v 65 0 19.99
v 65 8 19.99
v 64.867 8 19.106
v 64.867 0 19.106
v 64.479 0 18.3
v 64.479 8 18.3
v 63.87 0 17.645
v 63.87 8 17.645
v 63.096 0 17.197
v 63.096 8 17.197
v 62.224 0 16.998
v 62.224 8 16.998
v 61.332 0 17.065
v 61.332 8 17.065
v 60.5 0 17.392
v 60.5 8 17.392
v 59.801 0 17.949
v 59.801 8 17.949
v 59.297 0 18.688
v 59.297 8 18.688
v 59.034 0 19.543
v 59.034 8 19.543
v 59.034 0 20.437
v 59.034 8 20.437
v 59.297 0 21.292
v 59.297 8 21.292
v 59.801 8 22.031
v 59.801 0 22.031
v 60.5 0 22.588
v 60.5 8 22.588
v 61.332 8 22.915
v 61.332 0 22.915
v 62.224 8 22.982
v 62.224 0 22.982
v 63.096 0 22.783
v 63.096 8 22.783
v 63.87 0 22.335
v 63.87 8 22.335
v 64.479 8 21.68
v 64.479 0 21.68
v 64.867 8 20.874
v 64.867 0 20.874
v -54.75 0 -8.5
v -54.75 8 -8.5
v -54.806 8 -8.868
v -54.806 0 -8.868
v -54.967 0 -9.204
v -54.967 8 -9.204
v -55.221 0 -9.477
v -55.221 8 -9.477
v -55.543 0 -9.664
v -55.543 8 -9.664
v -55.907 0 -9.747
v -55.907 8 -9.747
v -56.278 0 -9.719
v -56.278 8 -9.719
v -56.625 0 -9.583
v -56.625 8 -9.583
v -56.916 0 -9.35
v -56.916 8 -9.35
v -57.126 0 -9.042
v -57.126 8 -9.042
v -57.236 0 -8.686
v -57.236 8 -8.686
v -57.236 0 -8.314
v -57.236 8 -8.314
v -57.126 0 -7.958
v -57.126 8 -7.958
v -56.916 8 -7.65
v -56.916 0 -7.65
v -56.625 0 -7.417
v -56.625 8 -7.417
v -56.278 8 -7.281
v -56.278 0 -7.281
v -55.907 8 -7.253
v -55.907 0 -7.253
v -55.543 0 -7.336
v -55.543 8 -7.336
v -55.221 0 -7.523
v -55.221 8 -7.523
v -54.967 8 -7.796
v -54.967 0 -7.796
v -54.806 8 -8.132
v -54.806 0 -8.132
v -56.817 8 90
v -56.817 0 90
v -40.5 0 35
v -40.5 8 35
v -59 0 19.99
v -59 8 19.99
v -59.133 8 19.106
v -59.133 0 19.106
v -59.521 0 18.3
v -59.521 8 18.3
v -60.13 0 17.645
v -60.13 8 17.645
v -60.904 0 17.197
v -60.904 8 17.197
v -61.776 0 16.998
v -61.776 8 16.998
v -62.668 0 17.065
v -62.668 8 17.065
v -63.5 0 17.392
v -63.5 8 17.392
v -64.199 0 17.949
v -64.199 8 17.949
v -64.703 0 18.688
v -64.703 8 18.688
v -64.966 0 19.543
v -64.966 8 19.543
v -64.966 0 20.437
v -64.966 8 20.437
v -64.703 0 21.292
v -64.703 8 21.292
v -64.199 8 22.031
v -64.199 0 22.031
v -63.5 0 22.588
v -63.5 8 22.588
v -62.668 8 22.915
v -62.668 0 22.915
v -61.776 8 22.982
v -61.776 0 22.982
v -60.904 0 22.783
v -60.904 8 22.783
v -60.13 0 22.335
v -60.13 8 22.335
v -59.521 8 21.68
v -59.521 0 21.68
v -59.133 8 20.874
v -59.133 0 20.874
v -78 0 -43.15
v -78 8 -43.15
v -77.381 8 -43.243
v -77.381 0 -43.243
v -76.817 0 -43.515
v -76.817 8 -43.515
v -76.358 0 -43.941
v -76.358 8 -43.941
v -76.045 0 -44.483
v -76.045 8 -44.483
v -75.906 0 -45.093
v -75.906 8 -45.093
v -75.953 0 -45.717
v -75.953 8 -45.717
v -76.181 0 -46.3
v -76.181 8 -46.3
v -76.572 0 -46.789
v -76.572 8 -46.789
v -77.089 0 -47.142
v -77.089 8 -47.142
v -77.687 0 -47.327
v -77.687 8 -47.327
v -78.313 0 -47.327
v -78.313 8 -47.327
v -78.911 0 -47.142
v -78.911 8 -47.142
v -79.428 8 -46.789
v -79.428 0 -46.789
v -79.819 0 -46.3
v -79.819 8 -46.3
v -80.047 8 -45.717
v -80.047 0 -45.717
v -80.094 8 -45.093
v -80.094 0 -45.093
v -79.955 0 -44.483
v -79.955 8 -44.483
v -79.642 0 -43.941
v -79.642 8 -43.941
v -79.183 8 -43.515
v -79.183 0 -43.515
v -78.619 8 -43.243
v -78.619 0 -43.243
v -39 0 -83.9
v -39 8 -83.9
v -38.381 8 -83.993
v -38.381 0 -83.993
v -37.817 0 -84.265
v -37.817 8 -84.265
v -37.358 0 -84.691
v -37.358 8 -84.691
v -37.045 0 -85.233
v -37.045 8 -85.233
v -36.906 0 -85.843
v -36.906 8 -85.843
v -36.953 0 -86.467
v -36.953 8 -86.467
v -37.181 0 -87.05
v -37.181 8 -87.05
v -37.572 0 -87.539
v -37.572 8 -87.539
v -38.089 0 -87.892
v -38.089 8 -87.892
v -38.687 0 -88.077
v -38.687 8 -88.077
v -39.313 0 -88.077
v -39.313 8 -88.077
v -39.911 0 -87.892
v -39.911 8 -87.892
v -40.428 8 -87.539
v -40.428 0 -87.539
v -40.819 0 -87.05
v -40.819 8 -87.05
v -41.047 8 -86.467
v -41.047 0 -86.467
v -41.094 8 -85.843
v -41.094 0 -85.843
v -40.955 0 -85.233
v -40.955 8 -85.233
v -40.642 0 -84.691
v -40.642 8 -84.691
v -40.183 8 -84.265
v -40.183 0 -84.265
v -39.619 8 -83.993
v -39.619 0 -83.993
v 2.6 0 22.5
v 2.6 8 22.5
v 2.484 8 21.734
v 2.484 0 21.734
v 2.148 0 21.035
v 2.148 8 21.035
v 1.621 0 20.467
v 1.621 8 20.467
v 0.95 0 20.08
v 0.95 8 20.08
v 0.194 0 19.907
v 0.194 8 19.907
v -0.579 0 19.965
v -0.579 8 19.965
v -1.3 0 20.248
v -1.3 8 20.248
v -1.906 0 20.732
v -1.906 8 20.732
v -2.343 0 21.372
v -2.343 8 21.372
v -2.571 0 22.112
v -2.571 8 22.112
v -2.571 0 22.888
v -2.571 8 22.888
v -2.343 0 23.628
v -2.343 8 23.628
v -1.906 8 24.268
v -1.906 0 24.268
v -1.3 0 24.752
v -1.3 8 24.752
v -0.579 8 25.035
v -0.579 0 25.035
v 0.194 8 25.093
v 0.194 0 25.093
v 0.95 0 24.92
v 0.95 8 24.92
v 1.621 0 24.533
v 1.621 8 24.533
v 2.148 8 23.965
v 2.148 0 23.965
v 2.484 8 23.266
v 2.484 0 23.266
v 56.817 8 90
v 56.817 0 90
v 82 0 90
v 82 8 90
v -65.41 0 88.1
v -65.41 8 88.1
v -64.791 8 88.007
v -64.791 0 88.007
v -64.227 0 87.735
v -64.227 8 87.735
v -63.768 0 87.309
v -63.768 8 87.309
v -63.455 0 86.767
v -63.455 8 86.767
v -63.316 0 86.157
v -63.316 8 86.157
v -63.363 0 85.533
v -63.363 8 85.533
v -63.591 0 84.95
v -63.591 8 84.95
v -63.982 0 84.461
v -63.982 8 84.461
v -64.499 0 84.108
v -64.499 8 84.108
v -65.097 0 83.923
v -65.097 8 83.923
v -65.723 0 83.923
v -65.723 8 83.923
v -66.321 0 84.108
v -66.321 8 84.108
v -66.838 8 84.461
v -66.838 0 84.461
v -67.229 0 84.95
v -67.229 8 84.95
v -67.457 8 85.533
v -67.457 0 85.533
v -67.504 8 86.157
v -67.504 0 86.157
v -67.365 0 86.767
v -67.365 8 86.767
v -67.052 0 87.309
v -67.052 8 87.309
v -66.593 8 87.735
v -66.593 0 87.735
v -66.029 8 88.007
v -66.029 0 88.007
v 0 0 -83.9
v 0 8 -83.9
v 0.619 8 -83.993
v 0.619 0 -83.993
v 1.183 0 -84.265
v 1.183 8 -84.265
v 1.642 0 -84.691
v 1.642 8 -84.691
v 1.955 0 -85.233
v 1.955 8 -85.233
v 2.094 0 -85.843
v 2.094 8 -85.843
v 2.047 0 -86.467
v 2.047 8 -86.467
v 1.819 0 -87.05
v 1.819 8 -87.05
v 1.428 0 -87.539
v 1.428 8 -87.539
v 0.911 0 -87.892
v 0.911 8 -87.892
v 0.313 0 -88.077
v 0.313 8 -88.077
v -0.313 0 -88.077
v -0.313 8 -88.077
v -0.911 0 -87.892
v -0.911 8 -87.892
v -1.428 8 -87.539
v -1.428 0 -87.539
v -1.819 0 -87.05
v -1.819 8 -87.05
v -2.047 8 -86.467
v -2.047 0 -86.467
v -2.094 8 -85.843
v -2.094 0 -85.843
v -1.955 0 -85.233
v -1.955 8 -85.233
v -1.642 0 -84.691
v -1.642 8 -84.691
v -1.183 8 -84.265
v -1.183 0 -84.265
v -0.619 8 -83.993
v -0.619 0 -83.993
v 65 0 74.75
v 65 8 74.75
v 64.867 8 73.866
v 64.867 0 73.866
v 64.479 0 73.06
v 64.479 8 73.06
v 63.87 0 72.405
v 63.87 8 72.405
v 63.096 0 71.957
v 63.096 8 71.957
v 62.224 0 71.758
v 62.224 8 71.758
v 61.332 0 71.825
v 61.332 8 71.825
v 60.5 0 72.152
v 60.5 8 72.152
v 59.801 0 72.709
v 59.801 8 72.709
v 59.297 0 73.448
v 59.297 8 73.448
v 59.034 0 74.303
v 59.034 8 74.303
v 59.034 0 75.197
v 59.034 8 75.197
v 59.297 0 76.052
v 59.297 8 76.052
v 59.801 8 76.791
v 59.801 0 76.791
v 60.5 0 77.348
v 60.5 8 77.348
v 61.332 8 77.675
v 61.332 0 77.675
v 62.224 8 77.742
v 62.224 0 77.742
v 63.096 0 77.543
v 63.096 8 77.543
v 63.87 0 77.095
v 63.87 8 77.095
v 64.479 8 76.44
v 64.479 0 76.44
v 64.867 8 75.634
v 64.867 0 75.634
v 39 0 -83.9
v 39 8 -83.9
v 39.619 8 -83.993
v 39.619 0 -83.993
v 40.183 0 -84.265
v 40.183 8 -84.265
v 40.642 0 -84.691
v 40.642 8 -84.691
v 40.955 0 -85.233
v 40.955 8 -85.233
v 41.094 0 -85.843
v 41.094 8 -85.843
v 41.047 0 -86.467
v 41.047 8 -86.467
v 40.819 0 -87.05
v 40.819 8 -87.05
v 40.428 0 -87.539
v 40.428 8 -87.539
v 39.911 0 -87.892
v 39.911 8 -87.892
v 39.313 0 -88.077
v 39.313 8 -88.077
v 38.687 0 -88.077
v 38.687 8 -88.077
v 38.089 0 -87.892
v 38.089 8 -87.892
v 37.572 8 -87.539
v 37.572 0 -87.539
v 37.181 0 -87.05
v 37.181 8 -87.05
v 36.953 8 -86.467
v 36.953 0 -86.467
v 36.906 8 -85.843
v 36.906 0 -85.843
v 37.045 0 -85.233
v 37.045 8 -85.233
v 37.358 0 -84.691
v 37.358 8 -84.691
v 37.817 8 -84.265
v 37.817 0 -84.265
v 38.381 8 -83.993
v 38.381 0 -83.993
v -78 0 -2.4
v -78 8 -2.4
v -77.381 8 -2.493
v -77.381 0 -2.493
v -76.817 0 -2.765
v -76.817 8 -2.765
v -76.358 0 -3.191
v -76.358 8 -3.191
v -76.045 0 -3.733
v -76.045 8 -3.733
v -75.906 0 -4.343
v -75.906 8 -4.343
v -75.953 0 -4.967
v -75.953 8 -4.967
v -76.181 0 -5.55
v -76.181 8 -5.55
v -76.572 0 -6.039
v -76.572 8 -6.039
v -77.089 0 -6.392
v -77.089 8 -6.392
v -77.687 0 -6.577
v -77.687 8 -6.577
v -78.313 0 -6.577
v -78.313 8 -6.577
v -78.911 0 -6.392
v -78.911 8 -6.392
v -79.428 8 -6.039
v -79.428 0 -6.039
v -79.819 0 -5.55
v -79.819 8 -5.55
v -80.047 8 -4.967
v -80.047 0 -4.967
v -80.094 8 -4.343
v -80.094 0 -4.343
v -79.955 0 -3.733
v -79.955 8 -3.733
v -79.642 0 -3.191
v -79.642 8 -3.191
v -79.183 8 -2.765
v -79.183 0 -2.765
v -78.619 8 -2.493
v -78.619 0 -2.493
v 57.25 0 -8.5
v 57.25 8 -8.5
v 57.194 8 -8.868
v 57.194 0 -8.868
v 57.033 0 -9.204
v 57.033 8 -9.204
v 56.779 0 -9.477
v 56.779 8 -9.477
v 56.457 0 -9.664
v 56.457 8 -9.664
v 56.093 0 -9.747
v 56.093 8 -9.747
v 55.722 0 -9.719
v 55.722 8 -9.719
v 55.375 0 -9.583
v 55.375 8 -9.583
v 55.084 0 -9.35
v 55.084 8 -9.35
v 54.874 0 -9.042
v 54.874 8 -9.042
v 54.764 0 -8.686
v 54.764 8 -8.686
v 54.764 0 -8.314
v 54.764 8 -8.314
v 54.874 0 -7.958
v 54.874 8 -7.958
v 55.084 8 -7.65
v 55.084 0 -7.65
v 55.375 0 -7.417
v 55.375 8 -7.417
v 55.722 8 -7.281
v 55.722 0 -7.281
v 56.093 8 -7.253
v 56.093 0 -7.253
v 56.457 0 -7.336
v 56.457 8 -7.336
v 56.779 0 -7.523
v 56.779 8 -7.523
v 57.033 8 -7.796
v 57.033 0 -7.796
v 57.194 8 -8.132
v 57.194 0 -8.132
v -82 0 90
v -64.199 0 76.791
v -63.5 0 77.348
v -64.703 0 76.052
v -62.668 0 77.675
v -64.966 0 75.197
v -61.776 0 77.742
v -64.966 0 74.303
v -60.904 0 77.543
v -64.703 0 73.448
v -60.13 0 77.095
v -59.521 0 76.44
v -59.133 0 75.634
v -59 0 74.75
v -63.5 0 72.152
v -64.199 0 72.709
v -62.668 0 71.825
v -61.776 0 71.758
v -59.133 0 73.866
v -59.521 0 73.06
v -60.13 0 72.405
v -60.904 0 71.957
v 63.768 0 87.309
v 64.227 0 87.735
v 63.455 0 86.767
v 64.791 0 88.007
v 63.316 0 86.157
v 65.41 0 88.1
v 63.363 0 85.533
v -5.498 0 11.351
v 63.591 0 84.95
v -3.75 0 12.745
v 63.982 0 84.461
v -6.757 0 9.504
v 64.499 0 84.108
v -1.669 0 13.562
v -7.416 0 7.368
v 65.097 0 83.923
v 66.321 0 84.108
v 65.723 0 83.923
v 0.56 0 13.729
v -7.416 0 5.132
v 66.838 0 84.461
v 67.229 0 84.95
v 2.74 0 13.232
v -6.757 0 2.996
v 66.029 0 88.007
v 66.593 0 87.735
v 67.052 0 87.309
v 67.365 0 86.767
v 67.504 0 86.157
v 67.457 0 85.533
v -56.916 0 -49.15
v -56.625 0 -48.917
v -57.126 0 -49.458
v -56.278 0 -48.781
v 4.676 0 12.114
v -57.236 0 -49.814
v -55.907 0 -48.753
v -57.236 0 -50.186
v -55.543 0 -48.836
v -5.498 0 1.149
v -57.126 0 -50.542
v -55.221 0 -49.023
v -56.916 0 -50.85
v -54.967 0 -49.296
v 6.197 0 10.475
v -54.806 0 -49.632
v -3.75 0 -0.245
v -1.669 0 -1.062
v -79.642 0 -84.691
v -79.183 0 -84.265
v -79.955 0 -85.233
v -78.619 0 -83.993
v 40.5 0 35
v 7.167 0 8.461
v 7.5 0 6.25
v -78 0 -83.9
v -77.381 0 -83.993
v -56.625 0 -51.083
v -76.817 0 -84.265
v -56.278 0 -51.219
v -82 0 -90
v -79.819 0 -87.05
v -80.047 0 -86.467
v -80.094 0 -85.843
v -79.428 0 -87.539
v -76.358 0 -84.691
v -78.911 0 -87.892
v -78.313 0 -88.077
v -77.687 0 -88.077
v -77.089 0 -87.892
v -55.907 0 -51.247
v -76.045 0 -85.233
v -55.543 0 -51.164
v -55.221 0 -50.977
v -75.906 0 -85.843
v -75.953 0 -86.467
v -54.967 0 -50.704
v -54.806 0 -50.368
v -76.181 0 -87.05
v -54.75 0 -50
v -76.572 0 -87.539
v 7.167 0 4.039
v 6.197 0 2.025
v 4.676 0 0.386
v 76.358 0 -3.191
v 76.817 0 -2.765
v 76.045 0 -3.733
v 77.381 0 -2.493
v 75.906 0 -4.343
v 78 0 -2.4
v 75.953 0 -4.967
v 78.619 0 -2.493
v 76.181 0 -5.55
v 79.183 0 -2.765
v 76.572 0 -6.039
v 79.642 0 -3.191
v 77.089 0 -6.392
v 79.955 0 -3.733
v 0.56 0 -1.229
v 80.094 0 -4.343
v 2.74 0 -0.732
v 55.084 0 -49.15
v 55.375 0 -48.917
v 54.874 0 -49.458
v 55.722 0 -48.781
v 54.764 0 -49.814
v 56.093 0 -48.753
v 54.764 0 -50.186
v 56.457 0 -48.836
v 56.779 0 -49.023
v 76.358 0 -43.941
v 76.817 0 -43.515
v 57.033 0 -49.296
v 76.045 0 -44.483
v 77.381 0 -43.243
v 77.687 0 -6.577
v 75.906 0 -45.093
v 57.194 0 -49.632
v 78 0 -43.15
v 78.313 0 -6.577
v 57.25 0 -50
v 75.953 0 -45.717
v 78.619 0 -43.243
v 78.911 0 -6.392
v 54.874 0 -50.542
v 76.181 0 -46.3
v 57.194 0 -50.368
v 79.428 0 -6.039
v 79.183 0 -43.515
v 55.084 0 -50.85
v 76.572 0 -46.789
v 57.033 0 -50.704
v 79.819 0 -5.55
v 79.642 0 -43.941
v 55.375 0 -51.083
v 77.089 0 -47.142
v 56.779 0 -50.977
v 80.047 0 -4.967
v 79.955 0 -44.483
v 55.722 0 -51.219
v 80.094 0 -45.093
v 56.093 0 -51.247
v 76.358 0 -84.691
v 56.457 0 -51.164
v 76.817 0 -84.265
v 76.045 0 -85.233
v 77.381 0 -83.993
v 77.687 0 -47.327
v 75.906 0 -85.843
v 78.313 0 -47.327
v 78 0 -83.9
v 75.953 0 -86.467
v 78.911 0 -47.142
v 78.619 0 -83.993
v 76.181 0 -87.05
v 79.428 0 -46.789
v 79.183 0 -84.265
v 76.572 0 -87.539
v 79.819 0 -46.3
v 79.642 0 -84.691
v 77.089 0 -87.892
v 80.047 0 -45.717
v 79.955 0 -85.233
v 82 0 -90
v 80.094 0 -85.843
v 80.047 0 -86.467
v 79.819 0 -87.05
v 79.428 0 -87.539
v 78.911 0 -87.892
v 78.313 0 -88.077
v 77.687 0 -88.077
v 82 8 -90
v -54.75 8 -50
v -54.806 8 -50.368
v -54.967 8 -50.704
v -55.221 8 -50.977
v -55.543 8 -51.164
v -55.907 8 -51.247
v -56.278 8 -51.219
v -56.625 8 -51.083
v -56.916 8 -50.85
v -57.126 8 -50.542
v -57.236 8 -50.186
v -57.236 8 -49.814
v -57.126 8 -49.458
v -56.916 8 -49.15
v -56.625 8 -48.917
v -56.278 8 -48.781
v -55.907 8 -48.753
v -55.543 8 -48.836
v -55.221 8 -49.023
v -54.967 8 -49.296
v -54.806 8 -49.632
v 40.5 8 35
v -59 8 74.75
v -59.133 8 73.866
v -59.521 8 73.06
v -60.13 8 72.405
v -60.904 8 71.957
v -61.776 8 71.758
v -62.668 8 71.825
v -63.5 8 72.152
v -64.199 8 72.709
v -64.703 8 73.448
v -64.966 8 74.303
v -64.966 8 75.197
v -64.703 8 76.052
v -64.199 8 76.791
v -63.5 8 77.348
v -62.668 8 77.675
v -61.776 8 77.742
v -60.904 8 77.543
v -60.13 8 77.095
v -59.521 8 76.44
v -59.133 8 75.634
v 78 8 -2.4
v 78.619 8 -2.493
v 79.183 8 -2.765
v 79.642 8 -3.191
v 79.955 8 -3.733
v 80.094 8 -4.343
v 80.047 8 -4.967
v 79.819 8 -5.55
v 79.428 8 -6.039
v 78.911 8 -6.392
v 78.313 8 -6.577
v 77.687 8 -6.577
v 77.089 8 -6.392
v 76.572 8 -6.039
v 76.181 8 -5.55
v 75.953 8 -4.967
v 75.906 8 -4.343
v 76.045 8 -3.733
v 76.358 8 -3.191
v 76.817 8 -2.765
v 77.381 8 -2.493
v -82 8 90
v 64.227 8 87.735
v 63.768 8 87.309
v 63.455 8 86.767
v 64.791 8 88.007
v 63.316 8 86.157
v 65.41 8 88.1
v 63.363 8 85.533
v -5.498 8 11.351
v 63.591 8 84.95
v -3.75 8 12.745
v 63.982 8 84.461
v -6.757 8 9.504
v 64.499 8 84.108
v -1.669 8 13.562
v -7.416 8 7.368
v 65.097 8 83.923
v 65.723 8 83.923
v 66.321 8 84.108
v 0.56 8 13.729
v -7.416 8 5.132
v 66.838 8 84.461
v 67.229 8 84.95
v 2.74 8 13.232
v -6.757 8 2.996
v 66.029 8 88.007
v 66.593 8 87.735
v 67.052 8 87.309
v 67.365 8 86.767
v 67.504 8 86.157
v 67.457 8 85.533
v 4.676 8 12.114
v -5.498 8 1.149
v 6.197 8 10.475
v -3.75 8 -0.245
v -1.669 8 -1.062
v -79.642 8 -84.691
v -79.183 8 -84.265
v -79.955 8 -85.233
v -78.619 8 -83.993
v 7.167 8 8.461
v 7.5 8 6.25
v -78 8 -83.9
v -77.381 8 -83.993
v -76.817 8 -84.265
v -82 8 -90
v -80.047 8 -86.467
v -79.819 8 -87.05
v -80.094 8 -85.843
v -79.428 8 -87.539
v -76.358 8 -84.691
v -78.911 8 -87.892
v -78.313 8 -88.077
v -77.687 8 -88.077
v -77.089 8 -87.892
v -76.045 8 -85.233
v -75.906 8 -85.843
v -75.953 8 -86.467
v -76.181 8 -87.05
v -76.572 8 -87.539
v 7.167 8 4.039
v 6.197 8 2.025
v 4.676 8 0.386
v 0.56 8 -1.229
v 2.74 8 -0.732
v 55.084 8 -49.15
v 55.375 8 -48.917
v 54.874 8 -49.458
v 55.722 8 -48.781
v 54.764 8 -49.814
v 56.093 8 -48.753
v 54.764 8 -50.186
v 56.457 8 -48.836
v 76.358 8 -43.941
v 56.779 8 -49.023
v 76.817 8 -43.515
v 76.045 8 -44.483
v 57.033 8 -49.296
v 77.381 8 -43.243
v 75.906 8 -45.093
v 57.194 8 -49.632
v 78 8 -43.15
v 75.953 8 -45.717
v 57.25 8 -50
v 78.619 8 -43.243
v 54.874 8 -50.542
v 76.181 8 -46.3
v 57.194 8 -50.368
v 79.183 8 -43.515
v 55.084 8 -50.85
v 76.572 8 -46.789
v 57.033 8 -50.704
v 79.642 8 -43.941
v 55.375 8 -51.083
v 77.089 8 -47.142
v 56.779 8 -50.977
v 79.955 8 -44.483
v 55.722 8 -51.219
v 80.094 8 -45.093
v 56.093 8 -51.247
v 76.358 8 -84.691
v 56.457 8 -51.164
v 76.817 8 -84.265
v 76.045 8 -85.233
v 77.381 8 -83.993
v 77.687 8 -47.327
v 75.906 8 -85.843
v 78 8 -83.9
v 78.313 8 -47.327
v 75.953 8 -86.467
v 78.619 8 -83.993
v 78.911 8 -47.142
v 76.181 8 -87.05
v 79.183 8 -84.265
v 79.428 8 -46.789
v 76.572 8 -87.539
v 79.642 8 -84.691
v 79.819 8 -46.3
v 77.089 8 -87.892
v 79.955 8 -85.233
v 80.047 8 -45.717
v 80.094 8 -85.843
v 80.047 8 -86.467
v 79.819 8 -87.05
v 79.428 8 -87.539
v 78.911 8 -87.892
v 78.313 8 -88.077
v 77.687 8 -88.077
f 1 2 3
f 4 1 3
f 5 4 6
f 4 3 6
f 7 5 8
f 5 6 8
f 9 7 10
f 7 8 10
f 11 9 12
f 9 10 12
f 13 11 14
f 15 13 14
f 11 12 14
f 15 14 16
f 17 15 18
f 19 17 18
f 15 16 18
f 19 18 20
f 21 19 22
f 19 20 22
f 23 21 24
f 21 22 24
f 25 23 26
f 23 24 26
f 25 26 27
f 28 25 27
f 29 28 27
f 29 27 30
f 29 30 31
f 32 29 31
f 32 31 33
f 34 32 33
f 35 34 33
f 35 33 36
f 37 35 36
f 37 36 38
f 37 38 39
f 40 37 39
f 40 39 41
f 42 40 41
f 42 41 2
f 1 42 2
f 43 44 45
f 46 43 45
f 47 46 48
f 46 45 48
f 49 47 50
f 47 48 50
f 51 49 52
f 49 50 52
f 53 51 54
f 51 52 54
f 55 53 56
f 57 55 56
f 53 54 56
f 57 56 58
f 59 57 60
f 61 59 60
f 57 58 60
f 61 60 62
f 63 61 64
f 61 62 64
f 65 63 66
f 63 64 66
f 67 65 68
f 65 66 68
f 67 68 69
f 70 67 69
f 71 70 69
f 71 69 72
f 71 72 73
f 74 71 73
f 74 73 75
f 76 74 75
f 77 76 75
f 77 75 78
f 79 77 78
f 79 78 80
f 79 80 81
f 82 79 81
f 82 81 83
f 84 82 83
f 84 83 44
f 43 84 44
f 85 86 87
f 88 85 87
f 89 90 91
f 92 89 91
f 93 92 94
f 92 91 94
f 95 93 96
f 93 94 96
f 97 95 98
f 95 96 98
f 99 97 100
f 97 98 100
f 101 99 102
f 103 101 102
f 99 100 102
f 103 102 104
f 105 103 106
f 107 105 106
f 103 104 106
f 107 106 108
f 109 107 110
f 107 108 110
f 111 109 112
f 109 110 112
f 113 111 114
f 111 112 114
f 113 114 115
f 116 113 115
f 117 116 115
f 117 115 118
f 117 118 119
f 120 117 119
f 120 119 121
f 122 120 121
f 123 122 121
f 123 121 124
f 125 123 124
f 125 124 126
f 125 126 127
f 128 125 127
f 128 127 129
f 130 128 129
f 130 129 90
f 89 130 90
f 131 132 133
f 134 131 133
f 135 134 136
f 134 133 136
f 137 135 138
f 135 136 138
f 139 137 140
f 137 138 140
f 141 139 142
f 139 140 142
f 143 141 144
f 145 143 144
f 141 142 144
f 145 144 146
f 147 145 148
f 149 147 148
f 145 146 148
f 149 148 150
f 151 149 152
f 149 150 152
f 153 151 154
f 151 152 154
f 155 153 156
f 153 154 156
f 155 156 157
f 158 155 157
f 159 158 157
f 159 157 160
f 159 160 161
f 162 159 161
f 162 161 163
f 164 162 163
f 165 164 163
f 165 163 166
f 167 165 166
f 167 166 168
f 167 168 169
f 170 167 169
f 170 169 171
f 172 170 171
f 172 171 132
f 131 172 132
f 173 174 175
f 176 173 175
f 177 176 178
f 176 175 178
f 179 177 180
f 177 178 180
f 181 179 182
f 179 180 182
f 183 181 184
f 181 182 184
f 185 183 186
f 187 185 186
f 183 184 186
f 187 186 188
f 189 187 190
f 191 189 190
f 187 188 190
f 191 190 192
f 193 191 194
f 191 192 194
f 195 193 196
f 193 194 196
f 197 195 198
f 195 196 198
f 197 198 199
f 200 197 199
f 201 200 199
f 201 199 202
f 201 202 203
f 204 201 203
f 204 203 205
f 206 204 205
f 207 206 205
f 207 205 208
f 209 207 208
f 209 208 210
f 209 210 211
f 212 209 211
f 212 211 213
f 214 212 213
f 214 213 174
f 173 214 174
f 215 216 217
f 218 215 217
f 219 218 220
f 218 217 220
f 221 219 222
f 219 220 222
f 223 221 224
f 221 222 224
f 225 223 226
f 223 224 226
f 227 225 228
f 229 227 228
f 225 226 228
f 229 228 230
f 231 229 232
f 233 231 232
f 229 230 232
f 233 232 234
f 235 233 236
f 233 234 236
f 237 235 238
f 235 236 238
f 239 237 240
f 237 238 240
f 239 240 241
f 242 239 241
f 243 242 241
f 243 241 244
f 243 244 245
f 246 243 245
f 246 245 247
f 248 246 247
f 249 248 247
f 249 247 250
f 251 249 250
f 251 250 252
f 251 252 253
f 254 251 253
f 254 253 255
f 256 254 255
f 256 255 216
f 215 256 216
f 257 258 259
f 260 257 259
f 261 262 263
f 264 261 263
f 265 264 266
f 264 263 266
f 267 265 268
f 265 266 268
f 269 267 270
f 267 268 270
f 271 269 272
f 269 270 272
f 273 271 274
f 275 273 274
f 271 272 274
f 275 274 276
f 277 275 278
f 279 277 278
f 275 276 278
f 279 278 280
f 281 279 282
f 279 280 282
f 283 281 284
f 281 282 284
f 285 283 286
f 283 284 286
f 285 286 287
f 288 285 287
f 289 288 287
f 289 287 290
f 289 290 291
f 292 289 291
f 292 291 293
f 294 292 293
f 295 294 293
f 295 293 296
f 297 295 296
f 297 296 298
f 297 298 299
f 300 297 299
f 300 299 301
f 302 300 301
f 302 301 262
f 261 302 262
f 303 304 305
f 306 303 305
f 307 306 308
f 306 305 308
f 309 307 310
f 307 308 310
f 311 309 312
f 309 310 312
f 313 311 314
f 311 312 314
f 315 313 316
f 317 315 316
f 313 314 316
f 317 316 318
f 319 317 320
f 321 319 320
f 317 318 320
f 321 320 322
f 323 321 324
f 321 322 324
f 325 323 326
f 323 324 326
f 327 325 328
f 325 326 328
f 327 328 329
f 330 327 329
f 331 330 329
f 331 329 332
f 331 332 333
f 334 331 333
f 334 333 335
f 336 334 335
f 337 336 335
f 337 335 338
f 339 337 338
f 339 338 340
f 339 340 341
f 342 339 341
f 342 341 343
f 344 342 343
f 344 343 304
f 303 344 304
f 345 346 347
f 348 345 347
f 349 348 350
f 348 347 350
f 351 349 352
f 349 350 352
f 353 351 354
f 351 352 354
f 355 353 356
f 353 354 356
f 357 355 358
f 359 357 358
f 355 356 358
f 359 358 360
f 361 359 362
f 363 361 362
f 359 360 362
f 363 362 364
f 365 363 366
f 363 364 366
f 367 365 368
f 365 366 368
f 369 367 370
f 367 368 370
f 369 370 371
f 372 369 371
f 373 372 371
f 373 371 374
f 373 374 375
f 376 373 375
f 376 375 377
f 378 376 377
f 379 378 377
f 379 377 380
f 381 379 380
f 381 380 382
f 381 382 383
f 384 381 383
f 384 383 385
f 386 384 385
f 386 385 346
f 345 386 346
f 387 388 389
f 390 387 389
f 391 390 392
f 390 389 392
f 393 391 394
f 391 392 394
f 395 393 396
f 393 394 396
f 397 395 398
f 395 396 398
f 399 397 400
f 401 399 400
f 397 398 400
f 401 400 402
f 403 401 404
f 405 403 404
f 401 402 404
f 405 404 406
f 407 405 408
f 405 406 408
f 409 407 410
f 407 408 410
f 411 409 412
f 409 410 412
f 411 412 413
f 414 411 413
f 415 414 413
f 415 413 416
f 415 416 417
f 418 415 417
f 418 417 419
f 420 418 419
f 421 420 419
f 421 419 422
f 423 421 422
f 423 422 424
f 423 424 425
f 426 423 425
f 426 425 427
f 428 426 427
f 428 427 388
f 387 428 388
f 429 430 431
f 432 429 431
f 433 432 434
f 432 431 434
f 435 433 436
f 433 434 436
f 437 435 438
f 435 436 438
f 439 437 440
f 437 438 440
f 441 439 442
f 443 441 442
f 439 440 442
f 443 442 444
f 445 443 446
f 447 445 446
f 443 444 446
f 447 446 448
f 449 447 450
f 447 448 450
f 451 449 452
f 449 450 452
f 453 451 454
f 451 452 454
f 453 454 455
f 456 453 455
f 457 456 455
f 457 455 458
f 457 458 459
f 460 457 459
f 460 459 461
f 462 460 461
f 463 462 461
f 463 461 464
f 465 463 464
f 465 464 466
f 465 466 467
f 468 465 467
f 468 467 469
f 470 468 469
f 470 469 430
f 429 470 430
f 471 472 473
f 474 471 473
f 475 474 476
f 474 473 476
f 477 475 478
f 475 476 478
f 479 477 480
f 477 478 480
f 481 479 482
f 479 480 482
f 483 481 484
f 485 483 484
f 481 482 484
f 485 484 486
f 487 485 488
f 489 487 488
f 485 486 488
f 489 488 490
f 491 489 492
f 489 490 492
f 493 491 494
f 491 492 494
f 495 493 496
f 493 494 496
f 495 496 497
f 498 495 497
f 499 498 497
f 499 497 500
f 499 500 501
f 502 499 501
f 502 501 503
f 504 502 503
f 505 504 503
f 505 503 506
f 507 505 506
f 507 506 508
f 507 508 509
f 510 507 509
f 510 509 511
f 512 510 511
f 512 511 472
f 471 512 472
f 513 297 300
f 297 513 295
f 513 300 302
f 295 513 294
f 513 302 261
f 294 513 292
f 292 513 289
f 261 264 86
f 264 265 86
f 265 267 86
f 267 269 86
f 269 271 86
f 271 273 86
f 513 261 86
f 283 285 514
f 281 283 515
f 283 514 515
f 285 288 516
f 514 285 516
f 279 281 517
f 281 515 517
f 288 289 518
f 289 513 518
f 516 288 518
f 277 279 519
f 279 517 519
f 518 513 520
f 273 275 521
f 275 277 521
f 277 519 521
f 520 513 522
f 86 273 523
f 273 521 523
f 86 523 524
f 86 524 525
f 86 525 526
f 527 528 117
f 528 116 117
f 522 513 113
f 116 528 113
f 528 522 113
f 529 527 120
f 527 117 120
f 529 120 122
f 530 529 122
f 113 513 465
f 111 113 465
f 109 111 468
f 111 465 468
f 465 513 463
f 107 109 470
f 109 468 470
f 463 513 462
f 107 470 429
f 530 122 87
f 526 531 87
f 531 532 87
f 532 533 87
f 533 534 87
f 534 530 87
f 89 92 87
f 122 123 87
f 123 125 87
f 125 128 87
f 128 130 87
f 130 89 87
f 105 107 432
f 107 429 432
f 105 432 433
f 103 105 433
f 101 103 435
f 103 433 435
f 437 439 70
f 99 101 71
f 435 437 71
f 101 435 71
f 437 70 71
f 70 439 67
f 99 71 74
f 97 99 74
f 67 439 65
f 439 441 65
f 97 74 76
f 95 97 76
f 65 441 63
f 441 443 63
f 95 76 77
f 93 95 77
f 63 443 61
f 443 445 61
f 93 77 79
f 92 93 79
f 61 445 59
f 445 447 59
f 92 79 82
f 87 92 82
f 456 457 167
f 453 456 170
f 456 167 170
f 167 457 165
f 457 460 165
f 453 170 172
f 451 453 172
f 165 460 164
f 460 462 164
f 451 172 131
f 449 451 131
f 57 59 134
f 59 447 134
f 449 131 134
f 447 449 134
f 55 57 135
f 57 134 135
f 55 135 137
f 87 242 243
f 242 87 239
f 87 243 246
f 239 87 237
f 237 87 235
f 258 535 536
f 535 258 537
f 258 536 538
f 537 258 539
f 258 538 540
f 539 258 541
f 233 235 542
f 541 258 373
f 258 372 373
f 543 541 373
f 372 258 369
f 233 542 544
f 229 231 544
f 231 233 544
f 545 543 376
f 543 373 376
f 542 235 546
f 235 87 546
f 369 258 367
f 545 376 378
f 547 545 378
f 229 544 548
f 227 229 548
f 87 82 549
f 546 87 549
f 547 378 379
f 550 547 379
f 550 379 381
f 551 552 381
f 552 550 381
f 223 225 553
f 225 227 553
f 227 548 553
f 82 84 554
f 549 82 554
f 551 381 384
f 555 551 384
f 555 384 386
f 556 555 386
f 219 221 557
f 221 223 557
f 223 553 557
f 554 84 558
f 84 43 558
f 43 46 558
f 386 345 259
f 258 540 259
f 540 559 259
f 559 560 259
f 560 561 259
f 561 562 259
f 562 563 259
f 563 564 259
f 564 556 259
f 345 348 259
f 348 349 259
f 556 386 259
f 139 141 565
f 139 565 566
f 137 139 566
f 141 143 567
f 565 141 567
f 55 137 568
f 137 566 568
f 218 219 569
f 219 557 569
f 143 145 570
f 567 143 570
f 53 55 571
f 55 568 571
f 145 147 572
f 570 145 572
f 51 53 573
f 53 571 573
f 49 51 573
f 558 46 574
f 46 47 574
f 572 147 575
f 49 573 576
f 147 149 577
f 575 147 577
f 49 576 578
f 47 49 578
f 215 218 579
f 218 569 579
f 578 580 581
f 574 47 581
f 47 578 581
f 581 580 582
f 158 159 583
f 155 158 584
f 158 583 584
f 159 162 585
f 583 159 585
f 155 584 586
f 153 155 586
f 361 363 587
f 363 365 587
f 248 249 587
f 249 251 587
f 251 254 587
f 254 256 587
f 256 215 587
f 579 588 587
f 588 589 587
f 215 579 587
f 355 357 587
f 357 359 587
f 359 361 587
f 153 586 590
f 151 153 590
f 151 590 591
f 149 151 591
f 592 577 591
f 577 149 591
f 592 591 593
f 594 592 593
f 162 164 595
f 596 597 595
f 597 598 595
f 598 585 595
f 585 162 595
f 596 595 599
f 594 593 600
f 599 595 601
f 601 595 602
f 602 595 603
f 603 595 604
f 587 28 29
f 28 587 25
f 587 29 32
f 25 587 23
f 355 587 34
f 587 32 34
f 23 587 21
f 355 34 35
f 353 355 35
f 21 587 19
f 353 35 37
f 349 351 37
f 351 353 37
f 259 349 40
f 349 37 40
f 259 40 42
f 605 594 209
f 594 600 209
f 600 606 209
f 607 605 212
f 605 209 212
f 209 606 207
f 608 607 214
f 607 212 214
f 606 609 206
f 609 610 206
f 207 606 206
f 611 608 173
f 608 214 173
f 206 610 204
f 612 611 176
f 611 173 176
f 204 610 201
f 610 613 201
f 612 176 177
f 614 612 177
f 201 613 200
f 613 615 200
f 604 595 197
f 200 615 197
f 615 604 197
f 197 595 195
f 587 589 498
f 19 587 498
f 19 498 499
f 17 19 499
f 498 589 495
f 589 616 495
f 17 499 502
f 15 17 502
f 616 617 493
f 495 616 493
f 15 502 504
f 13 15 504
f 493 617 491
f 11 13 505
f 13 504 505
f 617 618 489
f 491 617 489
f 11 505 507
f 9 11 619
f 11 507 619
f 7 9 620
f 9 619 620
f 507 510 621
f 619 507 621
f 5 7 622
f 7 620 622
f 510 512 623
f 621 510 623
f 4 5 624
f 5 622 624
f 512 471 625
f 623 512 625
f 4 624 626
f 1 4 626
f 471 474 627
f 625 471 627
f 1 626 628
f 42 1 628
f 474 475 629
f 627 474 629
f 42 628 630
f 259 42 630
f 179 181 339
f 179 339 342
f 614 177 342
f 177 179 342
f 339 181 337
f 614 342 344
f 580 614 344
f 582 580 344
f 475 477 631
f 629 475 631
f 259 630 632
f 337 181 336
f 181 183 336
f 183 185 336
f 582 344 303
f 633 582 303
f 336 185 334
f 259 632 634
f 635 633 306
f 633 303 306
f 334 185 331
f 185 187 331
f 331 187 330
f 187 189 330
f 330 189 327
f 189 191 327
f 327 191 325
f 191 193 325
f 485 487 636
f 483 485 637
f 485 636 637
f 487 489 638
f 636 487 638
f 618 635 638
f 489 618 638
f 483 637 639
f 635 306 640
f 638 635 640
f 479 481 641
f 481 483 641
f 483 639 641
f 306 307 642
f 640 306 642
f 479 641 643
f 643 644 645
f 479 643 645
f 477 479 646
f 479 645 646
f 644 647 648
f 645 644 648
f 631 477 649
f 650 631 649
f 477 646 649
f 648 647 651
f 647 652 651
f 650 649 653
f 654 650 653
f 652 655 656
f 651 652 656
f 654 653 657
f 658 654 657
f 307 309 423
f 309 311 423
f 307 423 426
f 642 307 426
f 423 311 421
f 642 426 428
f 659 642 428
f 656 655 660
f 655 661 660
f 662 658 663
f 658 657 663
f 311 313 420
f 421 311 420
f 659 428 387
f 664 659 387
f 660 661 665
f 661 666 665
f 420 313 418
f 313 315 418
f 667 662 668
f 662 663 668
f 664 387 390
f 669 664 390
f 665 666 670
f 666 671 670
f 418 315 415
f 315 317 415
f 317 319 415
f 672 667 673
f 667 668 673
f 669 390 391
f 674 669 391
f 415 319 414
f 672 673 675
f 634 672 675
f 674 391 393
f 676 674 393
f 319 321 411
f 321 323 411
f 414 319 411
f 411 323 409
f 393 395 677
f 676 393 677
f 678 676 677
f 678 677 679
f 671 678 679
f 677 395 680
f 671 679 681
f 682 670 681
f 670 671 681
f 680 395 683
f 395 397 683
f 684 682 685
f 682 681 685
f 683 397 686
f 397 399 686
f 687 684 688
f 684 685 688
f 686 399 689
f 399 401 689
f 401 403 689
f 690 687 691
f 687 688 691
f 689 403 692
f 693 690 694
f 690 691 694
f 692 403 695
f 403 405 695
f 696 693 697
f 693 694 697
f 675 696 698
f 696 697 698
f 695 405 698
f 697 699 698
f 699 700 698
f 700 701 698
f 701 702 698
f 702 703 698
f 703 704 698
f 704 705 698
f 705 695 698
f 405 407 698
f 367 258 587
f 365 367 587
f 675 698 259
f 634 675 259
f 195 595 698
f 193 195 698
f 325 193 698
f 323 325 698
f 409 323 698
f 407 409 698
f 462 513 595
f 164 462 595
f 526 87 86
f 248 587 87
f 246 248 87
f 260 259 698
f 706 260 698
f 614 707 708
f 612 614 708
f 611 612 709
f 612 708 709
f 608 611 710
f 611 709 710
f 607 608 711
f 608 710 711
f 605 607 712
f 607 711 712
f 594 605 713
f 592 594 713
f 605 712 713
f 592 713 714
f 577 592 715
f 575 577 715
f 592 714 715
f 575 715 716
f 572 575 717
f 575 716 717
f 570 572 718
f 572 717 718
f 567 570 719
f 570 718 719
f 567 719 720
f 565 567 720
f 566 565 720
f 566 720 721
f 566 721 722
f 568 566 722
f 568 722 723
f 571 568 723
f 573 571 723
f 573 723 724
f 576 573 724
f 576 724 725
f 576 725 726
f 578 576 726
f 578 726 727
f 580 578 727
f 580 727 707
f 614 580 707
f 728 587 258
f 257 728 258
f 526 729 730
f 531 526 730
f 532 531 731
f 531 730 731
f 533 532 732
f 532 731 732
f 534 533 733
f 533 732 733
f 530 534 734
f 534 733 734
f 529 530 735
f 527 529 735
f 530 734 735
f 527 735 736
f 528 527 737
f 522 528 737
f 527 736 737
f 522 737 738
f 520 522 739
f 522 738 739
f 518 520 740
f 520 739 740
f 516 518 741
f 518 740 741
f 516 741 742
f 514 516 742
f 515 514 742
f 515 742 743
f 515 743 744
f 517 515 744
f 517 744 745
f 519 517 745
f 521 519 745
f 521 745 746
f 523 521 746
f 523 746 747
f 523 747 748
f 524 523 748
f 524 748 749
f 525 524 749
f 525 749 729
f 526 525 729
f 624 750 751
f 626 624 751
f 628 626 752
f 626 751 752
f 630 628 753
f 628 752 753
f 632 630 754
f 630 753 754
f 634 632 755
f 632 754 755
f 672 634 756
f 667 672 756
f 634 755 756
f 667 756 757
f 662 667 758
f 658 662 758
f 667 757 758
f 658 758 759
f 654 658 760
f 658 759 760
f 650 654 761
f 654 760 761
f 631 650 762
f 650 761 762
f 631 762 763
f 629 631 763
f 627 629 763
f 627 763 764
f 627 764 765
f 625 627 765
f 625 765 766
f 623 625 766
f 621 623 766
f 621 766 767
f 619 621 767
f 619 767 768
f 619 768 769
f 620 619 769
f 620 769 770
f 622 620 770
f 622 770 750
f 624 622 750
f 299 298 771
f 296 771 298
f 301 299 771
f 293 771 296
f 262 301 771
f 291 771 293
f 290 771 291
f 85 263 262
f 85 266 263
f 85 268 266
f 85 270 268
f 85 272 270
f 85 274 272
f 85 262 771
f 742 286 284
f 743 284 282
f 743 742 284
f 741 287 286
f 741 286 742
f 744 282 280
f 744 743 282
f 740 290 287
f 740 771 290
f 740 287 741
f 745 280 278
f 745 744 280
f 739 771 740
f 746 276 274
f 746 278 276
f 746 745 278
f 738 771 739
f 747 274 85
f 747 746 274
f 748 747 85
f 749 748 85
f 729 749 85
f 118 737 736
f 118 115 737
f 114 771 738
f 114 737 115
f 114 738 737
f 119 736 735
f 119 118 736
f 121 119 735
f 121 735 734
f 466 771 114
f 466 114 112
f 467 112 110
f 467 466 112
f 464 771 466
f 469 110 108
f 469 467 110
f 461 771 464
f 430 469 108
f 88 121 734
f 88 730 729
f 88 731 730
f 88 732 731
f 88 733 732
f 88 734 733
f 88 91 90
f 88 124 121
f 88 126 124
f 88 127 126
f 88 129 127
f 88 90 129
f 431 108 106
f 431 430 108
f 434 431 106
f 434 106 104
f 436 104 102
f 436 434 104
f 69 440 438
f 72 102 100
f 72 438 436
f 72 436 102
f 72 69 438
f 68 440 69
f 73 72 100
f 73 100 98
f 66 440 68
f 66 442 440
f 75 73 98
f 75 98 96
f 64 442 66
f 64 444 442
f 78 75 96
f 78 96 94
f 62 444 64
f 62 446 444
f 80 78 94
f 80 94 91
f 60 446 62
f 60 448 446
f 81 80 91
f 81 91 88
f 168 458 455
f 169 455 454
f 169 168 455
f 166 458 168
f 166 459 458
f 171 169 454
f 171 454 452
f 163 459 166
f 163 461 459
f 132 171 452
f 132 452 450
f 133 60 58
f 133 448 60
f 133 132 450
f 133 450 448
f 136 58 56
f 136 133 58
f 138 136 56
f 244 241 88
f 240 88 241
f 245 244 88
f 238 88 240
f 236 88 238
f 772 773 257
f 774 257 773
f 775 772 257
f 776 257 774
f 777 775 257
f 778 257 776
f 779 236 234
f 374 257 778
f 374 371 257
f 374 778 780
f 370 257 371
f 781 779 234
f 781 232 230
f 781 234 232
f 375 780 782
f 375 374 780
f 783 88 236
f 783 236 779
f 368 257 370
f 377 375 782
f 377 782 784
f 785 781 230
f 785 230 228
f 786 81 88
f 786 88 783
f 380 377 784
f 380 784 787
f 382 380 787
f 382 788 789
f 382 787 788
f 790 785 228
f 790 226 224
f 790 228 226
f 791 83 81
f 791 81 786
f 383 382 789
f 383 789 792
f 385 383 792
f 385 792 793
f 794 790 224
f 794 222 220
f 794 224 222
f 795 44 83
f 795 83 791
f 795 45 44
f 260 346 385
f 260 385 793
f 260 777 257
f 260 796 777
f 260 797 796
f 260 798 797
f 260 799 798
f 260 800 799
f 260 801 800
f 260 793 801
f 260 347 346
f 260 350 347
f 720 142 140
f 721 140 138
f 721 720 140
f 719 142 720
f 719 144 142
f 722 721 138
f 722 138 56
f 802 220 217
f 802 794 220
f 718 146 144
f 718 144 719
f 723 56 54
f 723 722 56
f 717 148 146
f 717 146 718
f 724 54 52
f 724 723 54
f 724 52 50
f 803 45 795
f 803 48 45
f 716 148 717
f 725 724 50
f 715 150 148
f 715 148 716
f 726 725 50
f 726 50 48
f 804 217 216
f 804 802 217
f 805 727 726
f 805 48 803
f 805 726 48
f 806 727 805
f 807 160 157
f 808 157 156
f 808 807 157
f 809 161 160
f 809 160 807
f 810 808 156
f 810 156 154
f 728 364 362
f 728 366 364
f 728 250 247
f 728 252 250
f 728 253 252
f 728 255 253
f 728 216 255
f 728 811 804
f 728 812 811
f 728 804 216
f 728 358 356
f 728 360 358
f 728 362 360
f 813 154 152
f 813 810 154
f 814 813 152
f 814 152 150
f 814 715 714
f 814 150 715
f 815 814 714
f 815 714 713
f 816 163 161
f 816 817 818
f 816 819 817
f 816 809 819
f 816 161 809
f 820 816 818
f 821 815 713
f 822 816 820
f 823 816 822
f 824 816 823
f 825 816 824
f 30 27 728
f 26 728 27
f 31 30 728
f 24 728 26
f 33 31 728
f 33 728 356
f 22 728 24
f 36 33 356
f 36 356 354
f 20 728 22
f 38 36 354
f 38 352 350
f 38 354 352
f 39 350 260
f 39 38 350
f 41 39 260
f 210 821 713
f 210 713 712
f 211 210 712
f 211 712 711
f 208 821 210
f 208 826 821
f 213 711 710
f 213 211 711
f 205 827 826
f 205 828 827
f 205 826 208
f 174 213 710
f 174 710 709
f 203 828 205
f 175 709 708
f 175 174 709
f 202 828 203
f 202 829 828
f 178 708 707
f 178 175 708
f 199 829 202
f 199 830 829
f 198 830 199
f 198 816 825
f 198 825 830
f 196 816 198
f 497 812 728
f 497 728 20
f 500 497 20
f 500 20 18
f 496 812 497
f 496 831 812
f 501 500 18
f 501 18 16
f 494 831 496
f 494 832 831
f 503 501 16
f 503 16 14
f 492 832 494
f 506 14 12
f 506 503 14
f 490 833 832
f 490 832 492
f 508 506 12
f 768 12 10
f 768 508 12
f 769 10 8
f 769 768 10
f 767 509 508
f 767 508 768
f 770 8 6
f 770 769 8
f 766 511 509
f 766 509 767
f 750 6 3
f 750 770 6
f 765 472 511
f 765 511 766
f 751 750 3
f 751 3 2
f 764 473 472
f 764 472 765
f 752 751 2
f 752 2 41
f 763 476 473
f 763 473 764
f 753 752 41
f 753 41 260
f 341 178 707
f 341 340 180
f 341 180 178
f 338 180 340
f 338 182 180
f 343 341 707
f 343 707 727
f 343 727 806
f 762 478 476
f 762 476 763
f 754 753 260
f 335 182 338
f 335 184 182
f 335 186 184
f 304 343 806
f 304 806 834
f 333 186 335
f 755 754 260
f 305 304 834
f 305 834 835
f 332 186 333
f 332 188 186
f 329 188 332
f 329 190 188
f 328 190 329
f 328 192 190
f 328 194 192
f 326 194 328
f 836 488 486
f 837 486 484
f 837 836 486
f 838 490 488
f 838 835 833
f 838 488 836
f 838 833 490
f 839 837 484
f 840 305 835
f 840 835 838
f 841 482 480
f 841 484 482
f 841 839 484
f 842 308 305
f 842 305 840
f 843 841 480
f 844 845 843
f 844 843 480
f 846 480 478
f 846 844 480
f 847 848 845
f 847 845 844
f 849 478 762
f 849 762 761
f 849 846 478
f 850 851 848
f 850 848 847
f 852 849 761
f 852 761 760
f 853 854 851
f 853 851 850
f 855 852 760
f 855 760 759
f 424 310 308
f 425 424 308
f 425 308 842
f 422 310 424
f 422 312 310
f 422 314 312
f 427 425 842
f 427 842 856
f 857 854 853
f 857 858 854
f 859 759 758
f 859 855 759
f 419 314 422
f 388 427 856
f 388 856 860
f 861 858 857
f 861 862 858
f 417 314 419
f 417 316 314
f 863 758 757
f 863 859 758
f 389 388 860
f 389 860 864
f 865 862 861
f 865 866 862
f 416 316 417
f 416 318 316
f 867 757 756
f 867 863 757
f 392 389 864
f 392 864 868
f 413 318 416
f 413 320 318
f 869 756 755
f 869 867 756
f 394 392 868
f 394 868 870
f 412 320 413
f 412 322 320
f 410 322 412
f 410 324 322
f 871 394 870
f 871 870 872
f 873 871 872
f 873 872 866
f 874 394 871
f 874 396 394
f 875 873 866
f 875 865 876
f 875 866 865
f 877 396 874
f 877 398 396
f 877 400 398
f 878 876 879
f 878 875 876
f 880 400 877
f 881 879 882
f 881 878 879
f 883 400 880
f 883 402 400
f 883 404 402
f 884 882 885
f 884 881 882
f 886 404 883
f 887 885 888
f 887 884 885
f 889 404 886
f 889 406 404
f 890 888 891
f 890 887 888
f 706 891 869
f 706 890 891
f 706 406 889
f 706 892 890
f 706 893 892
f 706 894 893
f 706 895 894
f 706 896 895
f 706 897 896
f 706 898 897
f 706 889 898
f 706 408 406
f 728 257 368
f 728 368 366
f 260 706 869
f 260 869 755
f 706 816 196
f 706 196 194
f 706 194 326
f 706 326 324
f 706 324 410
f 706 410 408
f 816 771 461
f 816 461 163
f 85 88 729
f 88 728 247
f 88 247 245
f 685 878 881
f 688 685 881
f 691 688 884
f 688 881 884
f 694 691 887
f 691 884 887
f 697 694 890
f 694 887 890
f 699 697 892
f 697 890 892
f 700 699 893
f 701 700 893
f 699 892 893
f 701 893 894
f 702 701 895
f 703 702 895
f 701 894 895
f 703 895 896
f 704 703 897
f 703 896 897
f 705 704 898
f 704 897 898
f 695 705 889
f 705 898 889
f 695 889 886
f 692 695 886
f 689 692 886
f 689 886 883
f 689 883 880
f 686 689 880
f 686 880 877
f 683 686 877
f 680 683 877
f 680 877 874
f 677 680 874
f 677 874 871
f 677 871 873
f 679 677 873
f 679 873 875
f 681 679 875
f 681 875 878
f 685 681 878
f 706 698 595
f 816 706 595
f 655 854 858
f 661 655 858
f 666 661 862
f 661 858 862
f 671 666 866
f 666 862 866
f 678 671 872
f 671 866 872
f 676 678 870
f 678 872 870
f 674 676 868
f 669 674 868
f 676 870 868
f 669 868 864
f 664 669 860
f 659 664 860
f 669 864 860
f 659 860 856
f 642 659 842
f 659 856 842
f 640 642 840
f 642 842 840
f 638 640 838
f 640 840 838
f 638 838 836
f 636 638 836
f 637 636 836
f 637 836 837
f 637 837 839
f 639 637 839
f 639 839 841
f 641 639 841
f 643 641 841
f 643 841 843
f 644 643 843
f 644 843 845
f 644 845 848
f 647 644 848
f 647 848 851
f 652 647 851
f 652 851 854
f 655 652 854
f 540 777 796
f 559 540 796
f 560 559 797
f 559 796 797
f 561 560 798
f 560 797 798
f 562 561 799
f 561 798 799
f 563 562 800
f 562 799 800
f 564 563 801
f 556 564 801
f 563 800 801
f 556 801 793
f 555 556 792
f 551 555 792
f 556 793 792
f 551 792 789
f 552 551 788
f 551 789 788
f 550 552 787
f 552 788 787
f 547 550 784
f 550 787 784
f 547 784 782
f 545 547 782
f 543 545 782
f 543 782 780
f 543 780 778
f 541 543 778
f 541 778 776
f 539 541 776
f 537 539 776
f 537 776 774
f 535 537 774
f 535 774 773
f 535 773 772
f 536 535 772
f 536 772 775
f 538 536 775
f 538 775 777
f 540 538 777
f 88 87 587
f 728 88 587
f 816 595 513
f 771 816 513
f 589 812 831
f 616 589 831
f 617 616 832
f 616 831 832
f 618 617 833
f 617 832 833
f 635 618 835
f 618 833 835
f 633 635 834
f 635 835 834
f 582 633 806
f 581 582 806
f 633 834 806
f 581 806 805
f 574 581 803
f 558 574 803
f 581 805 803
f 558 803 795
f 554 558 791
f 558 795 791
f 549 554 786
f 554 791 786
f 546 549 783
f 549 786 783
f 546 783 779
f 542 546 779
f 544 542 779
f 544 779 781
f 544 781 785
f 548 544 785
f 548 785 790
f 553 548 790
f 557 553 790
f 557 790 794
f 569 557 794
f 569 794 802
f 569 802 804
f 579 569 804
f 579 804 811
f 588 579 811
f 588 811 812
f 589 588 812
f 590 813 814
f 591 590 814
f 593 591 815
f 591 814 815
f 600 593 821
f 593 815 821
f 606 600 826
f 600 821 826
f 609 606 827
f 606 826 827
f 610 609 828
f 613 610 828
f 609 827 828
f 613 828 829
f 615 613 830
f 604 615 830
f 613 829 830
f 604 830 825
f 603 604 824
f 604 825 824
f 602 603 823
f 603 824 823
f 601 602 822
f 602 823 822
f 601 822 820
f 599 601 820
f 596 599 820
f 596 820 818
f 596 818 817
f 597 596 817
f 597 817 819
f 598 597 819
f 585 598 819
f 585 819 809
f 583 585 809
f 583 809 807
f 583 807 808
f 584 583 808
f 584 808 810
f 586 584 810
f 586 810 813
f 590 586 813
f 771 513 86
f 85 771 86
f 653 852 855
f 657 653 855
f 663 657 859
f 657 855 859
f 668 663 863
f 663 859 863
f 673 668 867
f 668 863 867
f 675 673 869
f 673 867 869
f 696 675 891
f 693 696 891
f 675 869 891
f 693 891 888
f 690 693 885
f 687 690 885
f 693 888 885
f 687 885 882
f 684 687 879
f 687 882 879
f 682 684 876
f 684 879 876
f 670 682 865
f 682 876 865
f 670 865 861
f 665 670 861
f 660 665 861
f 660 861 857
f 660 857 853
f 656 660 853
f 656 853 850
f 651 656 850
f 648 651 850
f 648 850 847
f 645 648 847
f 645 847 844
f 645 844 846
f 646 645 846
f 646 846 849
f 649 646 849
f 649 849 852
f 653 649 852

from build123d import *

# Parameters (mm, degrees)
BOSS_EXTRUDE3_DEPTH = 8
SKETCH3_R           = 2.1
CUT_EXTRUDE2_DEPTH  = 10
CUT_EXTRUDE3_REACH  = 10
SKETCH5_R           = 3
SKETCH5_R_2         = 7.5
SKETCH5_R_3         = 2.6
CUT_EXTRUDE4_REACH  = 10
SKETCH6_R           = 1.25


with BuildPart() as part:
    # Sketch1 → Boss-Extrude3 (new body)
    with BuildSketch(Plane(origin=(0, 0, 0), x_dir=(1, 0, 0), z_dir=(0, 1, 0))):
        Polygon((40.5, -35), (56.816666667, -90), (82, -90), (82, 90), (-82, 90), (-82, -90), (-56.816666667, -90), (-40.5, -35), align=None)
    extrude(amount=BOSS_EXTRUDE3_DEPTH)

    # Sketch3 → Cut-Extrude2 (cut)
    with BuildSketch(Plane(origin=(-73, 8, 0), x_dir=(0, 0, 1), z_dir=(0, 1, 0))):
        with Locations((-45.25, -5)):
            Circle(SKETCH3_R)
        with Locations((-86, -5)):
            Circle(SKETCH3_R)
        with Locations((-86, 34)):
            Circle(SKETCH3_R)
        with Locations((-86, 73)):
            Circle(SKETCH3_R)
        with Locations((-86, 112)):
            Circle(SKETCH3_R)
        with Locations((-86, 151)):
            Circle(SKETCH3_R)
        with Locations((-4.5, -5)):
            Circle(SKETCH3_R)
        with Locations((-4.5, 151)):
            Circle(SKETCH3_R)
        with Locations((-45.25, 151)):
            Circle(SKETCH3_R)
        with Locations((86, 7.59)):
            Circle(SKETCH3_R)
        with Locations((86, 138.41)):
            Circle(SKETCH3_R)
    extrude(amount=-CUT_EXTRUDE2_DEPTH, mode=Mode.SUBTRACT)

    # Sketch5 → Cut-Extrude3 (cut, up to next)
    with BuildSketch(Plane(origin=(0, 8, 0), x_dir=(1, 0, 0), z_dir=(0, 1, 0)), mode=Mode.PRIVATE) as cut_extrude3_sk1:
        with Locations((62, -74.75)):
            Circle(SKETCH5_R)
    cut_extrude3_tool1 = extrude(cut_extrude3_sk1.sketch, amount=-CUT_EXTRUDE3_REACH, mode=Mode.PRIVATE) & part.part
    add(cut_extrude3_tool1.solids().sort_by_distance((62, 8, 74.75))[0], mode=Mode.SUBTRACT)
    # Sketch5 → Cut-Extrude3 (cut, up to next)
    with BuildSketch(Plane(origin=(0, 8, 0), x_dir=(1, 0, 0), z_dir=(0, 1, 0)), mode=Mode.PRIVATE) as cut_extrude3_sk2:
        with Locations((62, -19.99)):
            Circle(SKETCH5_R)
    cut_extrude3_tool2 = extrude(cut_extrude3_sk2.sketch, amount=-CUT_EXTRUDE3_REACH, mode=Mode.PRIVATE) & part.part
    add(cut_extrude3_tool2.solids().sort_by_distance((62, 8, 19.99))[0], mode=Mode.SUBTRACT)
    # Sketch5 → Cut-Extrude3 (cut, up to next)
    with BuildSketch(Plane(origin=(0, 8, 0), x_dir=(1, 0, 0), z_dir=(0, 1, 0)), mode=Mode.PRIVATE) as cut_extrude3_sk3:
        with Locations((-62, -74.75)):
            Circle(SKETCH5_R)
    cut_extrude3_tool3 = extrude(cut_extrude3_sk3.sketch, amount=-CUT_EXTRUDE3_REACH, mode=Mode.PRIVATE) & part.part
    add(cut_extrude3_tool3.solids().sort_by_distance((-62, 8, 74.75))[0], mode=Mode.SUBTRACT)
    # Sketch5 → Cut-Extrude3 (cut, up to next)
    with BuildSketch(Plane(origin=(0, 8, 0), x_dir=(1, 0, 0), z_dir=(0, 1, 0)), mode=Mode.PRIVATE) as cut_extrude3_sk4:
        with Locations((-62, -19.99)):
            Circle(SKETCH5_R)
    cut_extrude3_tool4 = extrude(cut_extrude3_sk4.sketch, amount=-CUT_EXTRUDE3_REACH, mode=Mode.PRIVATE) & part.part
    add(cut_extrude3_tool4.solids().sort_by_distance((-62, 8, 19.99))[0], mode=Mode.SUBTRACT)
    # Sketch5 → Cut-Extrude3 (cut, up to next)
    with BuildSketch(Plane(origin=(0, 8, 0), x_dir=(1, 0, 0), z_dir=(0, 1, 0)), mode=Mode.PRIVATE) as cut_extrude3_sk5:
        with Locations((0, -6.25)):
            Circle(SKETCH5_R_2)
    cut_extrude3_tool5 = extrude(cut_extrude3_sk5.sketch, amount=-CUT_EXTRUDE3_REACH, mode=Mode.PRIVATE) & part.part
    add(cut_extrude3_tool5.solids().sort_by_distance((0, 8, 6.25))[0], mode=Mode.SUBTRACT)
    # Sketch5 → Cut-Extrude3 (cut, up to next)
    with BuildSketch(Plane(origin=(0, 8, 0), x_dir=(1, 0, 0), z_dir=(0, 1, 0)), mode=Mode.PRIVATE) as cut_extrude3_sk6:
        with Locations((0, -22.5)):
            Circle(SKETCH5_R_3)
    cut_extrude3_tool6 = extrude(cut_extrude3_sk6.sketch, amount=-CUT_EXTRUDE3_REACH, mode=Mode.PRIVATE) & part.part
    add(cut_extrude3_tool6.solids().sort_by_distance((0, 8, 22.5))[0], mode=Mode.SUBTRACT)

    # Sketch6 → Cut-Extrude4 (cut, up to next)
    with BuildSketch(Plane(origin=(0, 8, 0), x_dir=(1, 0, 0), z_dir=(0, 1, 0)), mode=Mode.PRIVATE) as cut_extrude4_sk1:
        with Locations((-56, 8.5)):
            Circle(SKETCH6_R)
    cut_extrude4_tool1 = extrude(cut_extrude4_sk1.sketch, amount=-CUT_EXTRUDE4_REACH, mode=Mode.PRIVATE) & part.part
    add(cut_extrude4_tool1.solids().sort_by_distance((-56, 8, -8.5))[0], mode=Mode.SUBTRACT)
    # Sketch6 → Cut-Extrude4 (cut, up to next)
    with BuildSketch(Plane(origin=(0, 8, 0), x_dir=(1, 0, 0), z_dir=(0, 1, 0)), mode=Mode.PRIVATE) as cut_extrude4_sk2:
        with Locations((-56, 50)):
            Circle(SKETCH6_R)
    cut_extrude4_tool2 = extrude(cut_extrude4_sk2.sketch, amount=-CUT_EXTRUDE4_REACH, mode=Mode.PRIVATE) & part.part
    add(cut_extrude4_tool2.solids().sort_by_distance((-56, 8, -50))[0], mode=Mode.SUBTRACT)
    # Sketch6 → Cut-Extrude4 (cut, up to next)
    with BuildSketch(Plane(origin=(0, 8, 0), x_dir=(1, 0, 0), z_dir=(0, 1, 0)), mode=Mode.PRIVATE) as cut_extrude4_sk3:
        with Locations((56, 50)):
            Circle(SKETCH6_R)
    cut_extrude4_tool3 = extrude(cut_extrude4_sk3.sketch, amount=-CUT_EXTRUDE4_REACH, mode=Mode.PRIVATE) & part.part
    add(cut_extrude4_tool3.solids().sort_by_distance((56, 8, -50))[0], mode=Mode.SUBTRACT)
    # Sketch6 → Cut-Extrude4 (cut, up to next)
    with BuildSketch(Plane(origin=(0, 8, 0), x_dir=(1, 0, 0), z_dir=(0, 1, 0)), mode=Mode.PRIVATE) as cut_extrude4_sk4:
        with Locations((56, 8.5)):
            Circle(SKETCH6_R)
    cut_extrude4_tool4 = extrude(cut_extrude4_sk4.sketch, amount=-CUT_EXTRUDE4_REACH, mode=Mode.PRIVATE) & part.part
    add(cut_extrude4_tool4.solids().sort_by_distance((56, 8, -8.5))[0], mode=Mode.SUBTRACT)


solid = part.part
